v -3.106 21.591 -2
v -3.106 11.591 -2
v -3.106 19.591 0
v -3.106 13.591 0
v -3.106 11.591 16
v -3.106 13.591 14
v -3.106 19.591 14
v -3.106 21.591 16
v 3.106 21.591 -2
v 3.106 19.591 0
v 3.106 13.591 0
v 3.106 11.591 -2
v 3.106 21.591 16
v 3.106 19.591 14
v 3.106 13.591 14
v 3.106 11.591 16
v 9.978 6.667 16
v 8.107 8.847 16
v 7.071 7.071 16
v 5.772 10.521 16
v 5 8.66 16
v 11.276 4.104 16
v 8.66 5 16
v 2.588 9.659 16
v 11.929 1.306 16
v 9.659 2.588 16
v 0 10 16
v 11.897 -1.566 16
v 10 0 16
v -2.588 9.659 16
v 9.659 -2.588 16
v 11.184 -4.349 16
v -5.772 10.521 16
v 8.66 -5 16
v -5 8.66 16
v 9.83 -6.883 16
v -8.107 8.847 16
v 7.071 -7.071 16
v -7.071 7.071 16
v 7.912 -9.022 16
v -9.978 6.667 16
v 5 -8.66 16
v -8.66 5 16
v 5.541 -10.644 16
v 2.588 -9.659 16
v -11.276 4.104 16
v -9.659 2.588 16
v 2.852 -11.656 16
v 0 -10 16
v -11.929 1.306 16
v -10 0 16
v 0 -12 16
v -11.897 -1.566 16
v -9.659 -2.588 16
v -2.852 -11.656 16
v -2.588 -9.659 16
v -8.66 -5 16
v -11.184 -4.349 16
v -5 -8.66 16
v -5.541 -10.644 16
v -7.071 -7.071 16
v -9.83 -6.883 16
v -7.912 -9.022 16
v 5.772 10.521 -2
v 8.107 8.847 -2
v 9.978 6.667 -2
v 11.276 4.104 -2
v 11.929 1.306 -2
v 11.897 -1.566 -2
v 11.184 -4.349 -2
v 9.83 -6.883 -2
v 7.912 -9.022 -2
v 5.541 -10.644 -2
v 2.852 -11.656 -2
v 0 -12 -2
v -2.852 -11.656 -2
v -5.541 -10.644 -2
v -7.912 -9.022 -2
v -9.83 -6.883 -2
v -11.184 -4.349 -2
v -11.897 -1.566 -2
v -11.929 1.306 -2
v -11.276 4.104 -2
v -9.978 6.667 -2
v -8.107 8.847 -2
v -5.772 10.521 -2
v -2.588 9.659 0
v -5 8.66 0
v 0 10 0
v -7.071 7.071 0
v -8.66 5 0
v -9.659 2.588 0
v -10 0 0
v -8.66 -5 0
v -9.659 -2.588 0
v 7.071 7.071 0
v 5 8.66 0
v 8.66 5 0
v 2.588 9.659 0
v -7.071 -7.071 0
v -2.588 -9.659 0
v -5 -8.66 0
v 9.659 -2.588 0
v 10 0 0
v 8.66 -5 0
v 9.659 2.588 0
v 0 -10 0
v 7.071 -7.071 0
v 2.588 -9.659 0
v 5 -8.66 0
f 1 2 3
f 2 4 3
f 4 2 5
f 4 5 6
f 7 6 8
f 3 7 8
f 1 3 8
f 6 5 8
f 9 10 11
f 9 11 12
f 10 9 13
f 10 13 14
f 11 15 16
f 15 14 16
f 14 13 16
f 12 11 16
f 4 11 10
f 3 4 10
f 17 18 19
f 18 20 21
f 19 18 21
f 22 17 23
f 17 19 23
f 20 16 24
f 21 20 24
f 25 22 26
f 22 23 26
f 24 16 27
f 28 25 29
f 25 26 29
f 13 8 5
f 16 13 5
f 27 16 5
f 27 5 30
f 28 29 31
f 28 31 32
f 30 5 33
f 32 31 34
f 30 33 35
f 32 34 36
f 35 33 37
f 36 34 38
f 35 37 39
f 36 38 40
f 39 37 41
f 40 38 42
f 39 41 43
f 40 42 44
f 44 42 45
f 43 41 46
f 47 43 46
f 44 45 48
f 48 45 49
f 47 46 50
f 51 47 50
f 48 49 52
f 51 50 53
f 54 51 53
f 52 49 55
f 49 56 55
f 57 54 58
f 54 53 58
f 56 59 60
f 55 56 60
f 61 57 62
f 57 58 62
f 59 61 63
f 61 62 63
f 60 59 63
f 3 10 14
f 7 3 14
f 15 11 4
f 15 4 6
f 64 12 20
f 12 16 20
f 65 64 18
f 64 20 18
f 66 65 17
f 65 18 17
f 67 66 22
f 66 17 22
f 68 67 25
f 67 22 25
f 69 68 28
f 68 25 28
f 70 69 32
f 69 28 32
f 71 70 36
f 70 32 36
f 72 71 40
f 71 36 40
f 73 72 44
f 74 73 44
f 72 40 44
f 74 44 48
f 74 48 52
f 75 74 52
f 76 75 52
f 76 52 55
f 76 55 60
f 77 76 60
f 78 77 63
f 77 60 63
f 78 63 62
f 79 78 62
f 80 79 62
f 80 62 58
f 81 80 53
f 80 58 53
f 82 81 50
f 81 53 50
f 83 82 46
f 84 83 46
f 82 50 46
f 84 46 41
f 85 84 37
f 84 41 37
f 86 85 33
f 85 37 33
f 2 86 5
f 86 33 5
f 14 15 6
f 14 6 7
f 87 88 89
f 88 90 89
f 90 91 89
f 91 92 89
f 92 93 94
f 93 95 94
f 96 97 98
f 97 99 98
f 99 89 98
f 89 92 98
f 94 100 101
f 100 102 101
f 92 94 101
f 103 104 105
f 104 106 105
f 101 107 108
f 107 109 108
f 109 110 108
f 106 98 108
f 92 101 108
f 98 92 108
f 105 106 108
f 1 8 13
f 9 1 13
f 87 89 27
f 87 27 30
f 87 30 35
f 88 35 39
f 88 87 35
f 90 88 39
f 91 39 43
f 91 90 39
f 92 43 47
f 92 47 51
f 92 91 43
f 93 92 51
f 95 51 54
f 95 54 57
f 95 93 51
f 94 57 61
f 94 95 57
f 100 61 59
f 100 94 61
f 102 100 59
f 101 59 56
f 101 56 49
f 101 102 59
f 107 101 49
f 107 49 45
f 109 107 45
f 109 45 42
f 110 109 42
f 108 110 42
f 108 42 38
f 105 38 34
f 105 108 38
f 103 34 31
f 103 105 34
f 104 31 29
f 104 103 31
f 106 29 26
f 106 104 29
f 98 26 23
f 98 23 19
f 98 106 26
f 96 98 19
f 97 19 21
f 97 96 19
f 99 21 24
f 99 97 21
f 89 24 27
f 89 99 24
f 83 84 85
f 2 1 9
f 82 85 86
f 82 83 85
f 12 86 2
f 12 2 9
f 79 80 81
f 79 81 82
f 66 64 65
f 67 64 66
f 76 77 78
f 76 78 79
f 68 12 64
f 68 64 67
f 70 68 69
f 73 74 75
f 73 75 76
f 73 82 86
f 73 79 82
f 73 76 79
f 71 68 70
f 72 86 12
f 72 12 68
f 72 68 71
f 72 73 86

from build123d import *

# Parameters (mm, degrees)
SKETCH1_R           = 10
BOSS_EXTRUDE1_DEPTH = 16
BOSS_EXTRUDE2_DEPTH = 2
SKETCH3_W           = 6
SKETCH3_H           = 14
CUT_EXTRUDE1_DEPTH  = 6.211657


with BuildPart() as part:
    # Sketch1 → Boss-Extrude1 (new body)
    with BuildSketch(Plane(origin=(0, 0, 0), x_dir=(0, 1, 0), z_dir=(0, 0, 1))):
        with BuildLine():
            Line((11.591109915, 3.105828541), (21.591109915, 3.105828541))
            Line((21.591109915, 3.105828541), (21.591109915, -3.105828541))
            Line((21.591109915, -3.105828541), (11.591109915, -3.105828541))
            ThreePointArc((11.591109915, -3.105828541), (-12, 0), (11.591109915, 3.105828541))
        make_face()
        Circle(SKETCH1_R, mode=Mode.SUBTRACT)
    extrude(amount=BOSS_EXTRUDE1_DEPTH)

    # Sketch2 → Boss-Extrude2 (add)
    with BuildSketch(Plane(origin=(0, 0, 0), x_dir=(1, 0, 0), z_dir=(0, 0, -1))):
        with BuildLine():
            Line((-3.105828541, -21.591109915), (3.105828541, -21.591109915))
            Line((3.105828541, -21.591109915), (3.105828541, -11.591109915))
            ThreePointArc((3.105828541, -11.591109915), (0, 12), (-3.105828541, -11.591109915))
            Line((-3.105828541, -11.591109915), (-3.105828541, -21.591109915))
        make_face()
    extrude(amount=BOSS_EXTRUDE2_DEPTH)

    # Sketch3 → Cut-Extrude1 (cut)
    with BuildSketch(Plane.YZ.offset(3.105828541)):
        with Locations((16.591109915, 7)):
            Rectangle(SKETCH3_W, SKETCH3_H)
    extrude(amount=-CUT_EXTRUDE1_DEPTH, mode=Mode.SUBTRACT)


solid = part.part
